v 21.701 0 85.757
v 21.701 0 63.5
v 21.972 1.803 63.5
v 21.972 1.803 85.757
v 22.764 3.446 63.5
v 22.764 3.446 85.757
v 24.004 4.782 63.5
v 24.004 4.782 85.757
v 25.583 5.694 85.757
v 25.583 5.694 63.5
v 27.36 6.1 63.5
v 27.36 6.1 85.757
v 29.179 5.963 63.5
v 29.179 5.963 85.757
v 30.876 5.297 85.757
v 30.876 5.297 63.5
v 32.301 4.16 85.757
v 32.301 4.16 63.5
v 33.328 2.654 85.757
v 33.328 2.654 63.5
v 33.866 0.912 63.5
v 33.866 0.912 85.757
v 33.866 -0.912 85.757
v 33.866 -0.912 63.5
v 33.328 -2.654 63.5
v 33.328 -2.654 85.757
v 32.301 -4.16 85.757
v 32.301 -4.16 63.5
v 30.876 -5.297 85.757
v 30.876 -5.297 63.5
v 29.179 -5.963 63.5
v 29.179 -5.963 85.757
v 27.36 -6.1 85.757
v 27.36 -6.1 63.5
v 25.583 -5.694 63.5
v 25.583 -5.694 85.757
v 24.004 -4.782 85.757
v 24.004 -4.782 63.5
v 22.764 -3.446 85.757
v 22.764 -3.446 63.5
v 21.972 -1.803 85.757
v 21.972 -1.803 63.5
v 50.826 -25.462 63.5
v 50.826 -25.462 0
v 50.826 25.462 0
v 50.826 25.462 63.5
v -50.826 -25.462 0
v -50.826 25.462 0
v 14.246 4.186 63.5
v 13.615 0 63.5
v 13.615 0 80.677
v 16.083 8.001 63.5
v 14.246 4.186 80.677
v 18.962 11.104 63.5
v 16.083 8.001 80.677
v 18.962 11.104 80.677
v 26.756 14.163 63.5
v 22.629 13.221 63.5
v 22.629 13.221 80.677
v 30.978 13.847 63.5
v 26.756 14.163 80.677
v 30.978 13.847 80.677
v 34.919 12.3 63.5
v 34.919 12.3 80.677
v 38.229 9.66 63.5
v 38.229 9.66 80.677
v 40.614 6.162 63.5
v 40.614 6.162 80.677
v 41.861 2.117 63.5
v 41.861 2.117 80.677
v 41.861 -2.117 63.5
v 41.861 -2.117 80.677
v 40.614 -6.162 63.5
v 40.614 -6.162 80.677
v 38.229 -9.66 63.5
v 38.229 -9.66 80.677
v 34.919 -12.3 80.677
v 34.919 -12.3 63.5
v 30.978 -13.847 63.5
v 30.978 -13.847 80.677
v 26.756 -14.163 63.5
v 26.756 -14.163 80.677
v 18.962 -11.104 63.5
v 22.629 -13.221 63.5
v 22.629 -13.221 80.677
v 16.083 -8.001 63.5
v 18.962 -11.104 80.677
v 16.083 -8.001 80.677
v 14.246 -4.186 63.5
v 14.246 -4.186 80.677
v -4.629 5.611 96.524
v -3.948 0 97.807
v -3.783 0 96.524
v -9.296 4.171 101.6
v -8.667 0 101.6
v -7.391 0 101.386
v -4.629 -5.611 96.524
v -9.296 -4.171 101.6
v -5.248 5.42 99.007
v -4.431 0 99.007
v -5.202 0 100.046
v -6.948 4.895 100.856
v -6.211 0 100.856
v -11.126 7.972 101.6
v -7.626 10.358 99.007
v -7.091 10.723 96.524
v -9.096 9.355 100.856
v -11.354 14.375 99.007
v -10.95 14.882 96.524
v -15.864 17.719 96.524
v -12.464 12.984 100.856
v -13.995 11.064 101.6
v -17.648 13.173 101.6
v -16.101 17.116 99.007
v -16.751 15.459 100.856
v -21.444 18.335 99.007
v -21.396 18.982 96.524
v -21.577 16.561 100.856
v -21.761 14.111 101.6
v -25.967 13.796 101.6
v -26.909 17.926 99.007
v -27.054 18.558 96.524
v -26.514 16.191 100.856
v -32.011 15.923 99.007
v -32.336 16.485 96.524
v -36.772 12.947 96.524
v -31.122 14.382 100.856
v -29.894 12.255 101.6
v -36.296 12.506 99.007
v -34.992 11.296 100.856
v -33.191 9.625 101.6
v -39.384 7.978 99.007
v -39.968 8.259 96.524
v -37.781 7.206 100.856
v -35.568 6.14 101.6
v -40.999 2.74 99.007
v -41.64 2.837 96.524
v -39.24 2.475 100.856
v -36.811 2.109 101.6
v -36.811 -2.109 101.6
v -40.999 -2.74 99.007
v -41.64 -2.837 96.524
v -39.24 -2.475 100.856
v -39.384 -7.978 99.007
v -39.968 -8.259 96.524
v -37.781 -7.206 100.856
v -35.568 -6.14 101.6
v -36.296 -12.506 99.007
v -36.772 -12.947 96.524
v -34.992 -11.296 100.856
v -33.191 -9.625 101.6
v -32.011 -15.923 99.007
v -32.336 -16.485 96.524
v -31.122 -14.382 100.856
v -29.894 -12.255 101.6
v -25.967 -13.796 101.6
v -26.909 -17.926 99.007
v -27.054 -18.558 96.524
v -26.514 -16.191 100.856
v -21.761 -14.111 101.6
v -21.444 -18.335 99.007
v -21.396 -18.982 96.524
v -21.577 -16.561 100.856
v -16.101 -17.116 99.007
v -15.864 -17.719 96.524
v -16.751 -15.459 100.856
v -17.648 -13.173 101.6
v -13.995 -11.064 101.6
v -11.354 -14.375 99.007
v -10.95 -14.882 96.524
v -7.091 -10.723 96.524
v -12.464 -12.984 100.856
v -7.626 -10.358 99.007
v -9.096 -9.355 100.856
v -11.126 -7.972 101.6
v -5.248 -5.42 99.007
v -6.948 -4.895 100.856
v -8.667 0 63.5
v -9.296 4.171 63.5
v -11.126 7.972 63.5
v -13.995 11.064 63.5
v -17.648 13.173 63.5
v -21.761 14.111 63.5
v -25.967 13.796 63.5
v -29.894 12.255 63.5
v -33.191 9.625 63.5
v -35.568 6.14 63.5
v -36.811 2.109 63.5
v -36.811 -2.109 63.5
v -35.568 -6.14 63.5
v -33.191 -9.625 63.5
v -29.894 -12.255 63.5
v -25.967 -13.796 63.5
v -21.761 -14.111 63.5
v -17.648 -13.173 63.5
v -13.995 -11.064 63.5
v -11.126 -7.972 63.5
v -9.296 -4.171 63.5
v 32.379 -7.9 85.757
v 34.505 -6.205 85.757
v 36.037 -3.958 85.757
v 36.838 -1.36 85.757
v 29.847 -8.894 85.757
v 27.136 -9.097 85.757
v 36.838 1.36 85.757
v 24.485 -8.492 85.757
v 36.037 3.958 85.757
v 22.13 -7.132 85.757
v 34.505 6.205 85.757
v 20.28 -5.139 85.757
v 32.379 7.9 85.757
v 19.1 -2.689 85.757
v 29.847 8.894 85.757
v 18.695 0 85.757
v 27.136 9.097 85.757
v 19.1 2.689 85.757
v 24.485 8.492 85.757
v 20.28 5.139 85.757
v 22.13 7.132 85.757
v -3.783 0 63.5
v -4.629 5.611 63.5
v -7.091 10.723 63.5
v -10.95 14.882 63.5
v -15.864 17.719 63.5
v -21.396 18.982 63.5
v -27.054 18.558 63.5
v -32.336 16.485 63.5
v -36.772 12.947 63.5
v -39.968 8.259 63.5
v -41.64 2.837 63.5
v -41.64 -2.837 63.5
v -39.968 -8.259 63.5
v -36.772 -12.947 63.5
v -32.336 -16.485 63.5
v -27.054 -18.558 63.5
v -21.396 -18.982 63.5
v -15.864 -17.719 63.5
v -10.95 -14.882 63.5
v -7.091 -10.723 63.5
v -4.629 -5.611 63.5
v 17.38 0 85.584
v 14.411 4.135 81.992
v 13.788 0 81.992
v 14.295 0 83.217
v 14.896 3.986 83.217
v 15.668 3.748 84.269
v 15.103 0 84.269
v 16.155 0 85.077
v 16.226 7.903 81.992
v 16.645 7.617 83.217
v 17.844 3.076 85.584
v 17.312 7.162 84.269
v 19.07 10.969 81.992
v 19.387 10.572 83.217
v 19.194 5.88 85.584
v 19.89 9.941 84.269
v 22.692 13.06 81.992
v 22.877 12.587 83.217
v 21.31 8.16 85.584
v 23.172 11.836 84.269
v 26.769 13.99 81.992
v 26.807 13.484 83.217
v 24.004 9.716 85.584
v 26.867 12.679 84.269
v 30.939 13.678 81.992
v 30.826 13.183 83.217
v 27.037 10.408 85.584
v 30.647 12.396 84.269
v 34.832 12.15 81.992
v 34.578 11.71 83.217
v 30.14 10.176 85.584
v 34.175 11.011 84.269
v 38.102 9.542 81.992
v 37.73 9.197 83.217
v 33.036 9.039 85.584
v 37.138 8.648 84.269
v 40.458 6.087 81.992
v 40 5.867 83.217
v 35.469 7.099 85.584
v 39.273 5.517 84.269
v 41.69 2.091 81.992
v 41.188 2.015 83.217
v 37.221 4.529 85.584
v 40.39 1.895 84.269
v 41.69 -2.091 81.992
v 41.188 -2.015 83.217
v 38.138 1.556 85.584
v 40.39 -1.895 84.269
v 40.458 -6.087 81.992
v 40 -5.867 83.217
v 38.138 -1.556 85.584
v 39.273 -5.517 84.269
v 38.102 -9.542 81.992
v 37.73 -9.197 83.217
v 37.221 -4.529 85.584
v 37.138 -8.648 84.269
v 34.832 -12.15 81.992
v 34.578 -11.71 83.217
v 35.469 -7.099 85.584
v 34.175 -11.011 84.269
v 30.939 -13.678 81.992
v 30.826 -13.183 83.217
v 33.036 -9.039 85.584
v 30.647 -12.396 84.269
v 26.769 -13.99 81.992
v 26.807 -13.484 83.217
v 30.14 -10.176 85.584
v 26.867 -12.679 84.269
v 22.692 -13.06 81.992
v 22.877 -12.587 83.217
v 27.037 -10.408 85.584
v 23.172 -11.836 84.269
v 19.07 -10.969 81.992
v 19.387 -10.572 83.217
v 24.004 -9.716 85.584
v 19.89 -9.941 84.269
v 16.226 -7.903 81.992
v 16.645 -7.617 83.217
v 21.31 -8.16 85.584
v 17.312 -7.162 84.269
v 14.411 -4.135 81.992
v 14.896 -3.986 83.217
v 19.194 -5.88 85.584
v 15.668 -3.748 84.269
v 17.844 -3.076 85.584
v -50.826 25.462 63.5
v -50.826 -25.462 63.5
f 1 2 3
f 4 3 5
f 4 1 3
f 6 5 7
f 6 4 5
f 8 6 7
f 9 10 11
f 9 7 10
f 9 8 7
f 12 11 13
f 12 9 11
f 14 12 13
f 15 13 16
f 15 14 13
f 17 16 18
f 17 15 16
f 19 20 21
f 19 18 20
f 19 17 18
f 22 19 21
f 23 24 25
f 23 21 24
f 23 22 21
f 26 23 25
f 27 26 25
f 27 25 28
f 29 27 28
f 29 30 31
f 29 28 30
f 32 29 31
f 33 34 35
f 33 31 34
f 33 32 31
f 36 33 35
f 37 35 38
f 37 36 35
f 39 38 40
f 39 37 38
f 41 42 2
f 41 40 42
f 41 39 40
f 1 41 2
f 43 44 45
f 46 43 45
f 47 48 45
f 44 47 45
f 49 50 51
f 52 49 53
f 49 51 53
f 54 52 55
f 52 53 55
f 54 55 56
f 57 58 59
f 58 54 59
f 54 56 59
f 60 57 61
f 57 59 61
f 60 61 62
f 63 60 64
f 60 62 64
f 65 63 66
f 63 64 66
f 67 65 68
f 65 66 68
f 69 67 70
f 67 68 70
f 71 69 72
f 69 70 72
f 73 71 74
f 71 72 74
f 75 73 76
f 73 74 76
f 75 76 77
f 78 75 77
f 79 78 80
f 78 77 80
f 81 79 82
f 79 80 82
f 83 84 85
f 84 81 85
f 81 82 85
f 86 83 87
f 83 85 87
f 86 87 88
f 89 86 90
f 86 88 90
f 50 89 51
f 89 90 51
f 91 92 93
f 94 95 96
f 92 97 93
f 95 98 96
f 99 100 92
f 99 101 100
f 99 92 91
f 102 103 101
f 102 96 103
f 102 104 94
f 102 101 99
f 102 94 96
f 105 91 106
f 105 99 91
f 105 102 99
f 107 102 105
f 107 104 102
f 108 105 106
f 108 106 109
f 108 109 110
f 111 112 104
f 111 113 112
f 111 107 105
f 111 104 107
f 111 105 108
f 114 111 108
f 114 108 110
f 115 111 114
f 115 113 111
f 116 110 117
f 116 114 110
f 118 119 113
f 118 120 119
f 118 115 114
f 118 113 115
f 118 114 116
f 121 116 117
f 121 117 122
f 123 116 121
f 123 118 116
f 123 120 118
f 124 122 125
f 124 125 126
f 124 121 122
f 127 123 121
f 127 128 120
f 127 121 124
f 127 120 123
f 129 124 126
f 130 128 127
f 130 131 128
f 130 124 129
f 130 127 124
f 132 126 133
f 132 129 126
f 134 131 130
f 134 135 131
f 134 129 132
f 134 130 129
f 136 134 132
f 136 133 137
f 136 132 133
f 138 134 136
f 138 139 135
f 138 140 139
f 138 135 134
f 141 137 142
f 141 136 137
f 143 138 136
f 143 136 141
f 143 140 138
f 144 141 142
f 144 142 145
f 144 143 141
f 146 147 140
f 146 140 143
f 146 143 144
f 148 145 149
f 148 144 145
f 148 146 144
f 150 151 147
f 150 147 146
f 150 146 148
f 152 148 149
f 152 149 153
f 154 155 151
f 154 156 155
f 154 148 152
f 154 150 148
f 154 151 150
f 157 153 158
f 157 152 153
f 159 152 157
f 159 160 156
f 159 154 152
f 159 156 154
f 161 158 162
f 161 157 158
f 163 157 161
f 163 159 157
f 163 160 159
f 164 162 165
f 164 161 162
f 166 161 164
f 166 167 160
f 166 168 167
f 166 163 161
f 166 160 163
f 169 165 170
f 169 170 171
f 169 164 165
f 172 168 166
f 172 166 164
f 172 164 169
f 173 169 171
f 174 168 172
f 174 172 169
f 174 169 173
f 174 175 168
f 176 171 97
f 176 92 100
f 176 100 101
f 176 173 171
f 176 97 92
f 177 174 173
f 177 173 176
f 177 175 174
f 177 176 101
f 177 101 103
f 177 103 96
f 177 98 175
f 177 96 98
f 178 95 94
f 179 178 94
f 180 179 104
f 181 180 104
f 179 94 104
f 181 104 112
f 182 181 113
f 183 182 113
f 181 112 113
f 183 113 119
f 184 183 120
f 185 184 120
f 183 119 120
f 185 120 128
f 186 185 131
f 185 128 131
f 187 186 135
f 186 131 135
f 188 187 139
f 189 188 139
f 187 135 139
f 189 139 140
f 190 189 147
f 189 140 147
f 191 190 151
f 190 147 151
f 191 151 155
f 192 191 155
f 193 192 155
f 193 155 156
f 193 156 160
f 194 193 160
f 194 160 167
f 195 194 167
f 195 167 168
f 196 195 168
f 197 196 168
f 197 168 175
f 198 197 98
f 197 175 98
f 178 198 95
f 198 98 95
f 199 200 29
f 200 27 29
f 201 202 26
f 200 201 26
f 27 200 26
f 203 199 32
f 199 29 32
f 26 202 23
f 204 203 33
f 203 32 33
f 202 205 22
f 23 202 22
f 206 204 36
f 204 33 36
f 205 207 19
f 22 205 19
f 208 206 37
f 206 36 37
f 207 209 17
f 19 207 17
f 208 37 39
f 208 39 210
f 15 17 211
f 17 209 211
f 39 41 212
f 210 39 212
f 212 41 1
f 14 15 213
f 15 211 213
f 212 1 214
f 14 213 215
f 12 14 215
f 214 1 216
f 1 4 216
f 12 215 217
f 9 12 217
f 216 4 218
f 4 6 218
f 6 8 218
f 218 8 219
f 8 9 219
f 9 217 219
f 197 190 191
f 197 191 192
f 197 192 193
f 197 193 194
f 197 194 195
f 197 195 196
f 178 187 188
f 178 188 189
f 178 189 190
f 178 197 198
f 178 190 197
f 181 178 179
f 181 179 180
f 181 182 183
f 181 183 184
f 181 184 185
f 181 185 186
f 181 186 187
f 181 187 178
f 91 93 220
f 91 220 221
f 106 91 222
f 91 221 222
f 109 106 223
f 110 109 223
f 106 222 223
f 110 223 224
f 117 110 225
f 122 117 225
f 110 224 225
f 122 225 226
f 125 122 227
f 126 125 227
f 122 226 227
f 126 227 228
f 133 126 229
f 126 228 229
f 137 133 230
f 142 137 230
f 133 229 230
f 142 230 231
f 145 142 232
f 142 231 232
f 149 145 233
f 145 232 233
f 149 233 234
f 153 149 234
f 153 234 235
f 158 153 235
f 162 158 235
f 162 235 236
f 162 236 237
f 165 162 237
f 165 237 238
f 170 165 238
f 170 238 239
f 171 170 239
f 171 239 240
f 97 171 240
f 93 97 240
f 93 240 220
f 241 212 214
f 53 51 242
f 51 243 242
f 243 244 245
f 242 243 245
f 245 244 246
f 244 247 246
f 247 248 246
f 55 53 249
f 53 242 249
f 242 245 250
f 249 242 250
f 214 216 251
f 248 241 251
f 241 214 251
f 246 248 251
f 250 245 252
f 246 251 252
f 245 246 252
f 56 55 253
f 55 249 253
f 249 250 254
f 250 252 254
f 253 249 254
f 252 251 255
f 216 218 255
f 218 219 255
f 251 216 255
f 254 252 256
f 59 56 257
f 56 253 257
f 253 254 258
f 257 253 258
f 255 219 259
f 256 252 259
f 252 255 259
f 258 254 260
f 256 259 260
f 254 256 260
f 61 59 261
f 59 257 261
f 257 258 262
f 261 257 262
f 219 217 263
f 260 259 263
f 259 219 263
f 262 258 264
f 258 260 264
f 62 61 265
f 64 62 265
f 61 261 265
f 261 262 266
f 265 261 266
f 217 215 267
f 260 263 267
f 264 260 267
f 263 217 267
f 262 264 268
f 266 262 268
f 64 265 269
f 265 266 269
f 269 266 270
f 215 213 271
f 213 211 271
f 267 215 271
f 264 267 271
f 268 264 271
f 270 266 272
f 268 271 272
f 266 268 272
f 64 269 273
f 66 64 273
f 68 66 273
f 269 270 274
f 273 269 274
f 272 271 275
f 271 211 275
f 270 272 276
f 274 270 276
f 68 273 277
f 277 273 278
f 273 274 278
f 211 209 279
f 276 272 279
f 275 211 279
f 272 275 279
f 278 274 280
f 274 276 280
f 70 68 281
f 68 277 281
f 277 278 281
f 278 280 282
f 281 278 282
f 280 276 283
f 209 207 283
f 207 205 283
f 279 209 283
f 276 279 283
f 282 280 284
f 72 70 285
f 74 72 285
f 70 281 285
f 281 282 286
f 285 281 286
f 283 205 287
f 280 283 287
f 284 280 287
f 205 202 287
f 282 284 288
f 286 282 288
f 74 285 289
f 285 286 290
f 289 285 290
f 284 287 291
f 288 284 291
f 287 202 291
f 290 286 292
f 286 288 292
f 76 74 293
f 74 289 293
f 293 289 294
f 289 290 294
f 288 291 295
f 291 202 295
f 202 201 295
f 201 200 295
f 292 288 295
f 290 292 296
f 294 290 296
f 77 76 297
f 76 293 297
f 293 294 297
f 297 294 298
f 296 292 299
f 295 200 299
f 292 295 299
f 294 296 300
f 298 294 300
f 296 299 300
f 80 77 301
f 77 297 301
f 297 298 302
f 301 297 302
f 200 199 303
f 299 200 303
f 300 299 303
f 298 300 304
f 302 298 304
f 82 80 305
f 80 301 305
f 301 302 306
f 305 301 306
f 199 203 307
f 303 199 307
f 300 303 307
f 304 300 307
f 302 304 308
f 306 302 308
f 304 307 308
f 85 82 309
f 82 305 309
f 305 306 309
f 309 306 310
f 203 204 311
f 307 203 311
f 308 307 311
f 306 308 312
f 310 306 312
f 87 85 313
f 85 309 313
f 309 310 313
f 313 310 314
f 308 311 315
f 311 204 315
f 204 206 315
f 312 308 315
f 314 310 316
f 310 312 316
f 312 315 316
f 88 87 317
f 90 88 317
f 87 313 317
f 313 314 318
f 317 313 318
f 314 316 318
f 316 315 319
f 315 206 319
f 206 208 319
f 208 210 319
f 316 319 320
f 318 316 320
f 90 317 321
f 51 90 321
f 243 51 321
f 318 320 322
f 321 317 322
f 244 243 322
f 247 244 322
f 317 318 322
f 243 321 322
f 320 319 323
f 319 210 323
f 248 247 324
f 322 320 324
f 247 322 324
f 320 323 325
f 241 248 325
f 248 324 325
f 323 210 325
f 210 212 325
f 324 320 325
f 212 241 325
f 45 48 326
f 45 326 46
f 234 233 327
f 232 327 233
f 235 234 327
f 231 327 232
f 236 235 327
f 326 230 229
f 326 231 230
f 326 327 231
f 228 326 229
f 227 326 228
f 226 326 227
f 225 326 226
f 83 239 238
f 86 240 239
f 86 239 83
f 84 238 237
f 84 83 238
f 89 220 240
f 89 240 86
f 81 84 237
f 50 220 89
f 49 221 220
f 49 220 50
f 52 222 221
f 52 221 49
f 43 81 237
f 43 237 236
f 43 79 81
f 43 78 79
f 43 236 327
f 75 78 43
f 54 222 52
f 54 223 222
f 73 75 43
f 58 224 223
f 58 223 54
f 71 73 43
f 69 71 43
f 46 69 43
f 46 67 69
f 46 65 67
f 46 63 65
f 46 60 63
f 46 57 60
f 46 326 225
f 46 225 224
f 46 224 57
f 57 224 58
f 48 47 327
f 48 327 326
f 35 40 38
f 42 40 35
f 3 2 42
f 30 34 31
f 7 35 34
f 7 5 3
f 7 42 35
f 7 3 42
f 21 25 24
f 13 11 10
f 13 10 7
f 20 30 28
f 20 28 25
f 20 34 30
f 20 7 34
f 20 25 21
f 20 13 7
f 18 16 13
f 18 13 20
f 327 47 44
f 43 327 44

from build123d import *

# Parameters (mm, degrees)
F0_W     = 101.6528531909
F0_H     = 50.9243570268
F1_DEPTH = 63.5
F2_R     = 19.0350145172
F3_DEPTH = 38.1
F4_R     = 14.1510097993
F5_DEPTH = 38.1
F6_W     = 8.0858180299
F6_H     = 29.7073572874


# Not quite as in the source:
# - a fillet or chamfer that OpenCascade refuses, or shapes differently, is made with other operations: its cross-section is extruded or revolved along the edge and cut away or added


with BuildPart() as f1:
    # F0 (on Top) → F1 (new body)
    with BuildSketch(Plane.XY):
        Rectangle(F0_W, F0_H)
    extrude(amount=F1_DEPTH)

    # F2 (on face) → F3 (join)
    with BuildSketch(Plane.XY.offset(63.5)):
        with Locations((-22.8180289268, 0)):
            Circle(F2_R)
    extrude(amount=F3_DEPTH)

    # F4 (on face) → F5 (cut, through all)
    with BuildSketch(Plane.XY.offset(101.6)):
        with Locations((-22.8180289268, 0)):
            Circle(F4_R)
    extrude(amount=-F5_DEPTH, mode=Mode.SUBTRACT)

    # F6 (on Front) → F7 (revolve)
    with BuildSketch(Plane.XZ):
        with Locations((17.6577321254, 70.9035620093)):
            Rectangle(F6_W, F6_H)
    revolve(axis=Axis((27.8174318373, 0, 58.8010009378), (0, 0, -1)))

    # F8: fillet of radius 5.08 on 2 edges, made by hand

    # F8_s1 → F8_t2 (revolve, cut)
    with BuildSketch(Plane.XZ):
        with BuildLine():
            ThreePointArc((-3.7830144096, 96.5237823284), (-5.2022729524, 100.0459083885), (-8.6670191276, 101.6))
            Line((-8.6670191276, 101.6), (-3.7830144096, 101.6))
            Line((-3.7830144096, 101.6), (-3.7830144096, 96.5237823284))
        make_face()
    revolve(axis=Axis((-22.8180289268, 0, 101.6), (0, 0, 1)), mode=Mode.SUBTRACT)

    # F8_s3 → F8_t4 (revolve, cut)
    with BuildSketch(Plane.XZ):
        with BuildLine():
            ThreePointArc((13.6148231104, 80.677240653), (15.102720662, 84.2693431015), (18.6948231104, 85.757240653))
            Line((18.6948231104, 85.757240653), (13.6148231104, 85.757240653))
            Line((13.6148231104, 85.757240653), (13.6148231104, 80.677240653))
        make_face()
    revolve(axis=Axis((27.8174318373, 0, 85.757240653), (0, 0, -1)), mode=Mode.SUBTRACT)


solid = f1.part
